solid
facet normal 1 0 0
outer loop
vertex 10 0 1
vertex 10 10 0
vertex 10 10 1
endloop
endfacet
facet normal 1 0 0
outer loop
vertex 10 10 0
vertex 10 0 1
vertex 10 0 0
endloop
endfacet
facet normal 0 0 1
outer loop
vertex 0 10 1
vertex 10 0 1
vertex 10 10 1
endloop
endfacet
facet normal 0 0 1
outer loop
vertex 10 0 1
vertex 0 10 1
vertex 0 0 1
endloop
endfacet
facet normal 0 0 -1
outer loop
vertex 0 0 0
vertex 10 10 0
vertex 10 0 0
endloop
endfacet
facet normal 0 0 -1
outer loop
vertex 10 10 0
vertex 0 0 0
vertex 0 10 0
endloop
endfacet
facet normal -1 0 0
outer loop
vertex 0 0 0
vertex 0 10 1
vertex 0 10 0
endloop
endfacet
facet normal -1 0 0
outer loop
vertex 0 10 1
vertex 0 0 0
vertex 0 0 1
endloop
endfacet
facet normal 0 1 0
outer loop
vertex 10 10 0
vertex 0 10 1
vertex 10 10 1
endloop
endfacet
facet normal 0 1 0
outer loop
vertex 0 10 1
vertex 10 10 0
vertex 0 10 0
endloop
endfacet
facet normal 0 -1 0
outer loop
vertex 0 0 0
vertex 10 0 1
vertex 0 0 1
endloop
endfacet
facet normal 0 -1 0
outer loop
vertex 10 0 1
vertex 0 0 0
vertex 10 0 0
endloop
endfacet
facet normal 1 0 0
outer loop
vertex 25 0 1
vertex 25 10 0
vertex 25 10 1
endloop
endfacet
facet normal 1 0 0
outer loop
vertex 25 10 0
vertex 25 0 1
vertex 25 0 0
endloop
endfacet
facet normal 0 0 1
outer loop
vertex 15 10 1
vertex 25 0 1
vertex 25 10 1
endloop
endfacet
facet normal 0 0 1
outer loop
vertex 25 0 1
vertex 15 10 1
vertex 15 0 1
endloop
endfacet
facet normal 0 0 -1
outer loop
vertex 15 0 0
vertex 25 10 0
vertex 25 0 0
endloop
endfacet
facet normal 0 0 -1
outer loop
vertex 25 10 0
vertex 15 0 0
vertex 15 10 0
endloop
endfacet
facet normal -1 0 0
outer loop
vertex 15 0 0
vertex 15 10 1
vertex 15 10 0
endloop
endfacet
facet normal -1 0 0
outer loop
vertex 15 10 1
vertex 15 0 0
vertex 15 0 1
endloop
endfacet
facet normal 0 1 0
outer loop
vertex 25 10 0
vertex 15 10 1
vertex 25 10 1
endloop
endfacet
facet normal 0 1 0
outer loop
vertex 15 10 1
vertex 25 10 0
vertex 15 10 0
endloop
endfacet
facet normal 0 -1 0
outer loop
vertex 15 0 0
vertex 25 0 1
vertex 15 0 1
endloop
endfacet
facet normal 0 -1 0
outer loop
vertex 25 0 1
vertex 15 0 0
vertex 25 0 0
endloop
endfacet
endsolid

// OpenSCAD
// file: tools.scad
unit="cm";

//Draw reference axis
module drawAxis(s=1){
	rotate([0, 90, 0]) color("Crimson") cylinder(h=s, r1=s/20, r2=s/20, $fn=10);
	rotate([-90, 0, 0]) color("LimeGreen") cylinder(h=s, r1=s/20, r2=s/20, $fn=10);
	color("DodgerBlue") cylinder(h=s, r1=s/20, r2=s/20, $fn=10);
}

// drawAxis(1);
// 
// translate([2, 0, 0]) rotate([0, -45, 0]) drawAxis(1);
// 
// rotate([0, -45, 0]) translate([2, 0, 0]) drawAxis(1);
// main file
include <tools.scad>

//Draw a board and displays its dimensions
module board(length, width, thickness, quiet=true, name=""){
	cube([length, width, thickness]);
	
	if(!quiet){
		board=(name!="")?str("Board - ",name,":"):"Board:";
		echo(str(board,length,"x",width,"x",thickness," ",unit));
	}
}

board(10, 10, 1, false);

translate([15, 0, 0]) board(10, 10, 1, false, "left side");
